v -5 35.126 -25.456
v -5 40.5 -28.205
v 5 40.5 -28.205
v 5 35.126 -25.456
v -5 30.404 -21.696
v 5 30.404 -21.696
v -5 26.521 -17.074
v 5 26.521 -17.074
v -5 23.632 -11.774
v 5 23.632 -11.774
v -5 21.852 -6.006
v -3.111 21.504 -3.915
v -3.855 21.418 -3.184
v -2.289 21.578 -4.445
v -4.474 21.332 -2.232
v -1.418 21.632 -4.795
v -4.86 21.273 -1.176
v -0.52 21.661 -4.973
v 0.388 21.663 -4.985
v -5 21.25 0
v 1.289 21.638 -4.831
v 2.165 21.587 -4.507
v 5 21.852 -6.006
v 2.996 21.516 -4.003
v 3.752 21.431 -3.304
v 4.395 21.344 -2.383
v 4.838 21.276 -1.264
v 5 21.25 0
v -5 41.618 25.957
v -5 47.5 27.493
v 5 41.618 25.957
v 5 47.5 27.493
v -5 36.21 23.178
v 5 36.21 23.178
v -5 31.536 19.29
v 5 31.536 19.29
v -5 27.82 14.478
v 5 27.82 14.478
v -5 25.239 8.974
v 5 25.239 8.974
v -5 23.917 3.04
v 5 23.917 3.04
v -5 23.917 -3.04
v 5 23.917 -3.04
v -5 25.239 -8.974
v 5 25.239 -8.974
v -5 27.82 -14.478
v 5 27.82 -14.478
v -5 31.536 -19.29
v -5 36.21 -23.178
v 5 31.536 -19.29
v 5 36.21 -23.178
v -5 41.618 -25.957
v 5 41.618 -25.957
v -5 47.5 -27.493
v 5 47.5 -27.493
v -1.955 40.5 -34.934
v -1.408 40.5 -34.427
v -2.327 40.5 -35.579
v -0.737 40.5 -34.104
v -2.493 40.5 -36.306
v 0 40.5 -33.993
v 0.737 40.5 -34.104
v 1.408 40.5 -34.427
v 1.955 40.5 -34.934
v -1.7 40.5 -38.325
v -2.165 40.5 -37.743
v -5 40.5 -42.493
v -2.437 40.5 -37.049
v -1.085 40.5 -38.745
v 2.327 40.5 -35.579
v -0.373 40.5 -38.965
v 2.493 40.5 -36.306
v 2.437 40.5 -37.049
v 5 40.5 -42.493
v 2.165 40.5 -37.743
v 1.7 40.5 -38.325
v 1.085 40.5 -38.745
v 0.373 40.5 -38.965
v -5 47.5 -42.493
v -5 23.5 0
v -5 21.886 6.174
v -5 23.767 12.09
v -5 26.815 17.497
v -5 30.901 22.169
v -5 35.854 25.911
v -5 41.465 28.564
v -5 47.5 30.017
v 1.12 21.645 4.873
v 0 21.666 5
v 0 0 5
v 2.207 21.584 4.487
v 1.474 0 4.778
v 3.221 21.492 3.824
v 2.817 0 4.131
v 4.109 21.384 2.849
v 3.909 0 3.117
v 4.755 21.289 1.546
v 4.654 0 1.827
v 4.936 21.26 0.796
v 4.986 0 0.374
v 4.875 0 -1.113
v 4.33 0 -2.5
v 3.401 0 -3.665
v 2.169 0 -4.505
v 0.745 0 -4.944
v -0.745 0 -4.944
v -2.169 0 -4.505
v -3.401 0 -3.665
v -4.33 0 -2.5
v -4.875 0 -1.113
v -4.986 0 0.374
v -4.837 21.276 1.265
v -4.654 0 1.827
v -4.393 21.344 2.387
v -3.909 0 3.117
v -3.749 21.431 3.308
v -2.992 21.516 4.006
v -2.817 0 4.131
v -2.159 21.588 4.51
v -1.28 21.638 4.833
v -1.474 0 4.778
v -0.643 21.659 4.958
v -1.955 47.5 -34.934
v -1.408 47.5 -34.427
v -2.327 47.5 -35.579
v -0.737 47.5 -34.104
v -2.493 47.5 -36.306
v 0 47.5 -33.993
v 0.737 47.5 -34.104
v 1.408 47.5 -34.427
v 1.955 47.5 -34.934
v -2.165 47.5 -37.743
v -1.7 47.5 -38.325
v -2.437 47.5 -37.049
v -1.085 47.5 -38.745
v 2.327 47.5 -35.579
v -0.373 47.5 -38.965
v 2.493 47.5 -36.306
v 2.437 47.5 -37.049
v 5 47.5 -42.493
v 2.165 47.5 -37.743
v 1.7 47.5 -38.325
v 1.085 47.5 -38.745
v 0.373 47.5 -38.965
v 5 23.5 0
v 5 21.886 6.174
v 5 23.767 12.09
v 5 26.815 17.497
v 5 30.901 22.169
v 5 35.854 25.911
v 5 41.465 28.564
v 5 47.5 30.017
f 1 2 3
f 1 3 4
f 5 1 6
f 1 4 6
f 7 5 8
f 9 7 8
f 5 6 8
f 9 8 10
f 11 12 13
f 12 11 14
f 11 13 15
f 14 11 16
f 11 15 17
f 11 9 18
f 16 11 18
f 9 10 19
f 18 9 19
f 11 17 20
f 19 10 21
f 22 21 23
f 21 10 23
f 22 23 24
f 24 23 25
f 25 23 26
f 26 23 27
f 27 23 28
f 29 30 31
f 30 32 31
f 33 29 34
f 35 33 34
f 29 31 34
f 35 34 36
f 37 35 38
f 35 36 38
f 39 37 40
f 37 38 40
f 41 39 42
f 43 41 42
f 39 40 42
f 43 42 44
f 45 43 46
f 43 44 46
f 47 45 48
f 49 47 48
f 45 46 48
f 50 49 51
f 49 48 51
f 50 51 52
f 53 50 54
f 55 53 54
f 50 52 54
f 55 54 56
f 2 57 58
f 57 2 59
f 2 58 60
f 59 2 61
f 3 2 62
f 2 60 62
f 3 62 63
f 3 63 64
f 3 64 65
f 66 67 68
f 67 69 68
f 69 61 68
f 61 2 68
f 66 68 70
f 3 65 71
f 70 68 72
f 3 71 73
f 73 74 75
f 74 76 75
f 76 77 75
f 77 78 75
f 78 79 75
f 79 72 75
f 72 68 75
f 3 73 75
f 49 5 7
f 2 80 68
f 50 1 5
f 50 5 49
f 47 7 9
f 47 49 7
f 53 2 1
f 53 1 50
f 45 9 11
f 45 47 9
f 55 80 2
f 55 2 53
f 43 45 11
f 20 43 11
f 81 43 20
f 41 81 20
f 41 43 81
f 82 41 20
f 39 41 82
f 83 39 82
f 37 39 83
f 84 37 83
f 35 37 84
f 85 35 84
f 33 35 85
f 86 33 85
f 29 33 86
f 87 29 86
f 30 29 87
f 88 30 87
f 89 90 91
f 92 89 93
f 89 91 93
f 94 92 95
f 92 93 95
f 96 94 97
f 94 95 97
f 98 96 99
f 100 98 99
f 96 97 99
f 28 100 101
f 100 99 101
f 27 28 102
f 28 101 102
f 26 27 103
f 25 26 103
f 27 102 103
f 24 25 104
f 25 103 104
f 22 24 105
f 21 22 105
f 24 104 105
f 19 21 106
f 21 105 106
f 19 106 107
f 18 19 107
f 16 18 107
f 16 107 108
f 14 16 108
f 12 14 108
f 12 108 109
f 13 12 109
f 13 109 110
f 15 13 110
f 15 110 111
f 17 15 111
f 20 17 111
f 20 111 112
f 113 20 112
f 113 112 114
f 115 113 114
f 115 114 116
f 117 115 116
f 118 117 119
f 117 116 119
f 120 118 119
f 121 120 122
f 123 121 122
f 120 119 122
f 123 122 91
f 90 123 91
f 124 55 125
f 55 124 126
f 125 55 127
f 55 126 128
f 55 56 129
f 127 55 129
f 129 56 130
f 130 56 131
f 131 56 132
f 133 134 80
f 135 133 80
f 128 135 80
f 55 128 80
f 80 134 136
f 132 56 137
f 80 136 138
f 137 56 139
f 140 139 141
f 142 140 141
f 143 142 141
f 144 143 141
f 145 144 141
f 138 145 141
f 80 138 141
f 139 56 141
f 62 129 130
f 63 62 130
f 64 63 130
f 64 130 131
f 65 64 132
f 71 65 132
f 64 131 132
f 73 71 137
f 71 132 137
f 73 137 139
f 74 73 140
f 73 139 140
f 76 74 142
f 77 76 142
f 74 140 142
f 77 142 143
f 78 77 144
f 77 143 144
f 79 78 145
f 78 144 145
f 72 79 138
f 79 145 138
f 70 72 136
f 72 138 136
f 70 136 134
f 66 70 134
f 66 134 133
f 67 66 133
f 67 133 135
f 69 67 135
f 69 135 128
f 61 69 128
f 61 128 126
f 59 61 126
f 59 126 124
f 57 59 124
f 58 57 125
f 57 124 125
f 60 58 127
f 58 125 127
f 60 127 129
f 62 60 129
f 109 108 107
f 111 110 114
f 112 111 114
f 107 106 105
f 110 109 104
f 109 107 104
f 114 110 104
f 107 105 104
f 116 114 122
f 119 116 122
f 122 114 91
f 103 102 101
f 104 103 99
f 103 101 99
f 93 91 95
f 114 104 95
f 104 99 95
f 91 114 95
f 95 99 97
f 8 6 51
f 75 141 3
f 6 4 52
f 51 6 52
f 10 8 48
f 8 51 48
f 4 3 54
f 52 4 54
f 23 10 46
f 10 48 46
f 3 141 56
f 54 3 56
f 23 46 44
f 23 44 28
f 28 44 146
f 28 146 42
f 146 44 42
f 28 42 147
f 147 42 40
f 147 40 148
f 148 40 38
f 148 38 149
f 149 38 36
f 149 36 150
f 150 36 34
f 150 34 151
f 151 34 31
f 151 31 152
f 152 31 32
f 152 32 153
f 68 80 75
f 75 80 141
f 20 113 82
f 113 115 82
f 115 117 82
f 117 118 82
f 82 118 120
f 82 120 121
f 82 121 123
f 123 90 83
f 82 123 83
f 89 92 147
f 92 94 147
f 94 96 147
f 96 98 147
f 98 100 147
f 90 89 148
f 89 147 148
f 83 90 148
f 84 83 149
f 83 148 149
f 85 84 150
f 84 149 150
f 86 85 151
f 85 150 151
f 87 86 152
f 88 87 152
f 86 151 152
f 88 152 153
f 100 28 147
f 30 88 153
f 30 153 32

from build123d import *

# Parameters (mm, degrees)
SKETCH1_R           = 5
BOSS_EXTRUDE1_DEPTH = 23.5
BOSS_EXTRUDE2_DEPTH = 5
SKETCH3_W           = 10
SKETCH3_H           = 15
SKETCH3_R           = 2.5
BOSS_EXTRUDE3_DEPTH = 7


with BuildPart() as part:
    # Sketch1 → Boss-Extrude1 (new body)
    with BuildSketch(Plane(origin=(0, 0, 0), x_dir=(1, 0, 0), z_dir=(0, 1, 0))):
        with Locations(Location((0, 0, 0), (0, 0, 270))):
            Circle(SKETCH1_R)
    extrude(amount=BOSS_EXTRUDE1_DEPTH)

    # Sketch2 → Boss-Extrude2 (add, symmetric)
    with BuildSketch(Plane(origin=(0, 0, 0), x_dir=(0, 0, -1), z_dir=(1, 0, 0))):
        with BuildLine():
            Line((-30.017270029, 47.5), (-27.492699031, 47.5))
            ThreePointArc((-27.492699031, 47.5), (0, 23.75), (27.492699031, 47.5))
            Line((27.492699031, 47.5), (30.017270029, 47.5))
            ThreePointArc((30.017270029, 47.5), (0, 21.25), (-30.017270029, 47.5))
        make_face()
    extrude(amount=BOSS_EXTRUDE2_DEPTH, both=True)

    # Sketch3 → Boss-Extrude3 (add)
    with BuildSketch(Plane(origin=(0, 47.5, 0), x_dir=(1, 0, 0), z_dir=(0, 1, 0))):
        with Locations((0, 34.992699031)):
            Rectangle(SKETCH3_W, SKETCH3_H)
        with Locations(Location((0, 36.492699031, 0), (0, 0, 270))):
            Circle(SKETCH3_R, mode=Mode.SUBTRACT)
    extrude(amount=-BOSS_EXTRUDE3_DEPTH)


solid = part.part
